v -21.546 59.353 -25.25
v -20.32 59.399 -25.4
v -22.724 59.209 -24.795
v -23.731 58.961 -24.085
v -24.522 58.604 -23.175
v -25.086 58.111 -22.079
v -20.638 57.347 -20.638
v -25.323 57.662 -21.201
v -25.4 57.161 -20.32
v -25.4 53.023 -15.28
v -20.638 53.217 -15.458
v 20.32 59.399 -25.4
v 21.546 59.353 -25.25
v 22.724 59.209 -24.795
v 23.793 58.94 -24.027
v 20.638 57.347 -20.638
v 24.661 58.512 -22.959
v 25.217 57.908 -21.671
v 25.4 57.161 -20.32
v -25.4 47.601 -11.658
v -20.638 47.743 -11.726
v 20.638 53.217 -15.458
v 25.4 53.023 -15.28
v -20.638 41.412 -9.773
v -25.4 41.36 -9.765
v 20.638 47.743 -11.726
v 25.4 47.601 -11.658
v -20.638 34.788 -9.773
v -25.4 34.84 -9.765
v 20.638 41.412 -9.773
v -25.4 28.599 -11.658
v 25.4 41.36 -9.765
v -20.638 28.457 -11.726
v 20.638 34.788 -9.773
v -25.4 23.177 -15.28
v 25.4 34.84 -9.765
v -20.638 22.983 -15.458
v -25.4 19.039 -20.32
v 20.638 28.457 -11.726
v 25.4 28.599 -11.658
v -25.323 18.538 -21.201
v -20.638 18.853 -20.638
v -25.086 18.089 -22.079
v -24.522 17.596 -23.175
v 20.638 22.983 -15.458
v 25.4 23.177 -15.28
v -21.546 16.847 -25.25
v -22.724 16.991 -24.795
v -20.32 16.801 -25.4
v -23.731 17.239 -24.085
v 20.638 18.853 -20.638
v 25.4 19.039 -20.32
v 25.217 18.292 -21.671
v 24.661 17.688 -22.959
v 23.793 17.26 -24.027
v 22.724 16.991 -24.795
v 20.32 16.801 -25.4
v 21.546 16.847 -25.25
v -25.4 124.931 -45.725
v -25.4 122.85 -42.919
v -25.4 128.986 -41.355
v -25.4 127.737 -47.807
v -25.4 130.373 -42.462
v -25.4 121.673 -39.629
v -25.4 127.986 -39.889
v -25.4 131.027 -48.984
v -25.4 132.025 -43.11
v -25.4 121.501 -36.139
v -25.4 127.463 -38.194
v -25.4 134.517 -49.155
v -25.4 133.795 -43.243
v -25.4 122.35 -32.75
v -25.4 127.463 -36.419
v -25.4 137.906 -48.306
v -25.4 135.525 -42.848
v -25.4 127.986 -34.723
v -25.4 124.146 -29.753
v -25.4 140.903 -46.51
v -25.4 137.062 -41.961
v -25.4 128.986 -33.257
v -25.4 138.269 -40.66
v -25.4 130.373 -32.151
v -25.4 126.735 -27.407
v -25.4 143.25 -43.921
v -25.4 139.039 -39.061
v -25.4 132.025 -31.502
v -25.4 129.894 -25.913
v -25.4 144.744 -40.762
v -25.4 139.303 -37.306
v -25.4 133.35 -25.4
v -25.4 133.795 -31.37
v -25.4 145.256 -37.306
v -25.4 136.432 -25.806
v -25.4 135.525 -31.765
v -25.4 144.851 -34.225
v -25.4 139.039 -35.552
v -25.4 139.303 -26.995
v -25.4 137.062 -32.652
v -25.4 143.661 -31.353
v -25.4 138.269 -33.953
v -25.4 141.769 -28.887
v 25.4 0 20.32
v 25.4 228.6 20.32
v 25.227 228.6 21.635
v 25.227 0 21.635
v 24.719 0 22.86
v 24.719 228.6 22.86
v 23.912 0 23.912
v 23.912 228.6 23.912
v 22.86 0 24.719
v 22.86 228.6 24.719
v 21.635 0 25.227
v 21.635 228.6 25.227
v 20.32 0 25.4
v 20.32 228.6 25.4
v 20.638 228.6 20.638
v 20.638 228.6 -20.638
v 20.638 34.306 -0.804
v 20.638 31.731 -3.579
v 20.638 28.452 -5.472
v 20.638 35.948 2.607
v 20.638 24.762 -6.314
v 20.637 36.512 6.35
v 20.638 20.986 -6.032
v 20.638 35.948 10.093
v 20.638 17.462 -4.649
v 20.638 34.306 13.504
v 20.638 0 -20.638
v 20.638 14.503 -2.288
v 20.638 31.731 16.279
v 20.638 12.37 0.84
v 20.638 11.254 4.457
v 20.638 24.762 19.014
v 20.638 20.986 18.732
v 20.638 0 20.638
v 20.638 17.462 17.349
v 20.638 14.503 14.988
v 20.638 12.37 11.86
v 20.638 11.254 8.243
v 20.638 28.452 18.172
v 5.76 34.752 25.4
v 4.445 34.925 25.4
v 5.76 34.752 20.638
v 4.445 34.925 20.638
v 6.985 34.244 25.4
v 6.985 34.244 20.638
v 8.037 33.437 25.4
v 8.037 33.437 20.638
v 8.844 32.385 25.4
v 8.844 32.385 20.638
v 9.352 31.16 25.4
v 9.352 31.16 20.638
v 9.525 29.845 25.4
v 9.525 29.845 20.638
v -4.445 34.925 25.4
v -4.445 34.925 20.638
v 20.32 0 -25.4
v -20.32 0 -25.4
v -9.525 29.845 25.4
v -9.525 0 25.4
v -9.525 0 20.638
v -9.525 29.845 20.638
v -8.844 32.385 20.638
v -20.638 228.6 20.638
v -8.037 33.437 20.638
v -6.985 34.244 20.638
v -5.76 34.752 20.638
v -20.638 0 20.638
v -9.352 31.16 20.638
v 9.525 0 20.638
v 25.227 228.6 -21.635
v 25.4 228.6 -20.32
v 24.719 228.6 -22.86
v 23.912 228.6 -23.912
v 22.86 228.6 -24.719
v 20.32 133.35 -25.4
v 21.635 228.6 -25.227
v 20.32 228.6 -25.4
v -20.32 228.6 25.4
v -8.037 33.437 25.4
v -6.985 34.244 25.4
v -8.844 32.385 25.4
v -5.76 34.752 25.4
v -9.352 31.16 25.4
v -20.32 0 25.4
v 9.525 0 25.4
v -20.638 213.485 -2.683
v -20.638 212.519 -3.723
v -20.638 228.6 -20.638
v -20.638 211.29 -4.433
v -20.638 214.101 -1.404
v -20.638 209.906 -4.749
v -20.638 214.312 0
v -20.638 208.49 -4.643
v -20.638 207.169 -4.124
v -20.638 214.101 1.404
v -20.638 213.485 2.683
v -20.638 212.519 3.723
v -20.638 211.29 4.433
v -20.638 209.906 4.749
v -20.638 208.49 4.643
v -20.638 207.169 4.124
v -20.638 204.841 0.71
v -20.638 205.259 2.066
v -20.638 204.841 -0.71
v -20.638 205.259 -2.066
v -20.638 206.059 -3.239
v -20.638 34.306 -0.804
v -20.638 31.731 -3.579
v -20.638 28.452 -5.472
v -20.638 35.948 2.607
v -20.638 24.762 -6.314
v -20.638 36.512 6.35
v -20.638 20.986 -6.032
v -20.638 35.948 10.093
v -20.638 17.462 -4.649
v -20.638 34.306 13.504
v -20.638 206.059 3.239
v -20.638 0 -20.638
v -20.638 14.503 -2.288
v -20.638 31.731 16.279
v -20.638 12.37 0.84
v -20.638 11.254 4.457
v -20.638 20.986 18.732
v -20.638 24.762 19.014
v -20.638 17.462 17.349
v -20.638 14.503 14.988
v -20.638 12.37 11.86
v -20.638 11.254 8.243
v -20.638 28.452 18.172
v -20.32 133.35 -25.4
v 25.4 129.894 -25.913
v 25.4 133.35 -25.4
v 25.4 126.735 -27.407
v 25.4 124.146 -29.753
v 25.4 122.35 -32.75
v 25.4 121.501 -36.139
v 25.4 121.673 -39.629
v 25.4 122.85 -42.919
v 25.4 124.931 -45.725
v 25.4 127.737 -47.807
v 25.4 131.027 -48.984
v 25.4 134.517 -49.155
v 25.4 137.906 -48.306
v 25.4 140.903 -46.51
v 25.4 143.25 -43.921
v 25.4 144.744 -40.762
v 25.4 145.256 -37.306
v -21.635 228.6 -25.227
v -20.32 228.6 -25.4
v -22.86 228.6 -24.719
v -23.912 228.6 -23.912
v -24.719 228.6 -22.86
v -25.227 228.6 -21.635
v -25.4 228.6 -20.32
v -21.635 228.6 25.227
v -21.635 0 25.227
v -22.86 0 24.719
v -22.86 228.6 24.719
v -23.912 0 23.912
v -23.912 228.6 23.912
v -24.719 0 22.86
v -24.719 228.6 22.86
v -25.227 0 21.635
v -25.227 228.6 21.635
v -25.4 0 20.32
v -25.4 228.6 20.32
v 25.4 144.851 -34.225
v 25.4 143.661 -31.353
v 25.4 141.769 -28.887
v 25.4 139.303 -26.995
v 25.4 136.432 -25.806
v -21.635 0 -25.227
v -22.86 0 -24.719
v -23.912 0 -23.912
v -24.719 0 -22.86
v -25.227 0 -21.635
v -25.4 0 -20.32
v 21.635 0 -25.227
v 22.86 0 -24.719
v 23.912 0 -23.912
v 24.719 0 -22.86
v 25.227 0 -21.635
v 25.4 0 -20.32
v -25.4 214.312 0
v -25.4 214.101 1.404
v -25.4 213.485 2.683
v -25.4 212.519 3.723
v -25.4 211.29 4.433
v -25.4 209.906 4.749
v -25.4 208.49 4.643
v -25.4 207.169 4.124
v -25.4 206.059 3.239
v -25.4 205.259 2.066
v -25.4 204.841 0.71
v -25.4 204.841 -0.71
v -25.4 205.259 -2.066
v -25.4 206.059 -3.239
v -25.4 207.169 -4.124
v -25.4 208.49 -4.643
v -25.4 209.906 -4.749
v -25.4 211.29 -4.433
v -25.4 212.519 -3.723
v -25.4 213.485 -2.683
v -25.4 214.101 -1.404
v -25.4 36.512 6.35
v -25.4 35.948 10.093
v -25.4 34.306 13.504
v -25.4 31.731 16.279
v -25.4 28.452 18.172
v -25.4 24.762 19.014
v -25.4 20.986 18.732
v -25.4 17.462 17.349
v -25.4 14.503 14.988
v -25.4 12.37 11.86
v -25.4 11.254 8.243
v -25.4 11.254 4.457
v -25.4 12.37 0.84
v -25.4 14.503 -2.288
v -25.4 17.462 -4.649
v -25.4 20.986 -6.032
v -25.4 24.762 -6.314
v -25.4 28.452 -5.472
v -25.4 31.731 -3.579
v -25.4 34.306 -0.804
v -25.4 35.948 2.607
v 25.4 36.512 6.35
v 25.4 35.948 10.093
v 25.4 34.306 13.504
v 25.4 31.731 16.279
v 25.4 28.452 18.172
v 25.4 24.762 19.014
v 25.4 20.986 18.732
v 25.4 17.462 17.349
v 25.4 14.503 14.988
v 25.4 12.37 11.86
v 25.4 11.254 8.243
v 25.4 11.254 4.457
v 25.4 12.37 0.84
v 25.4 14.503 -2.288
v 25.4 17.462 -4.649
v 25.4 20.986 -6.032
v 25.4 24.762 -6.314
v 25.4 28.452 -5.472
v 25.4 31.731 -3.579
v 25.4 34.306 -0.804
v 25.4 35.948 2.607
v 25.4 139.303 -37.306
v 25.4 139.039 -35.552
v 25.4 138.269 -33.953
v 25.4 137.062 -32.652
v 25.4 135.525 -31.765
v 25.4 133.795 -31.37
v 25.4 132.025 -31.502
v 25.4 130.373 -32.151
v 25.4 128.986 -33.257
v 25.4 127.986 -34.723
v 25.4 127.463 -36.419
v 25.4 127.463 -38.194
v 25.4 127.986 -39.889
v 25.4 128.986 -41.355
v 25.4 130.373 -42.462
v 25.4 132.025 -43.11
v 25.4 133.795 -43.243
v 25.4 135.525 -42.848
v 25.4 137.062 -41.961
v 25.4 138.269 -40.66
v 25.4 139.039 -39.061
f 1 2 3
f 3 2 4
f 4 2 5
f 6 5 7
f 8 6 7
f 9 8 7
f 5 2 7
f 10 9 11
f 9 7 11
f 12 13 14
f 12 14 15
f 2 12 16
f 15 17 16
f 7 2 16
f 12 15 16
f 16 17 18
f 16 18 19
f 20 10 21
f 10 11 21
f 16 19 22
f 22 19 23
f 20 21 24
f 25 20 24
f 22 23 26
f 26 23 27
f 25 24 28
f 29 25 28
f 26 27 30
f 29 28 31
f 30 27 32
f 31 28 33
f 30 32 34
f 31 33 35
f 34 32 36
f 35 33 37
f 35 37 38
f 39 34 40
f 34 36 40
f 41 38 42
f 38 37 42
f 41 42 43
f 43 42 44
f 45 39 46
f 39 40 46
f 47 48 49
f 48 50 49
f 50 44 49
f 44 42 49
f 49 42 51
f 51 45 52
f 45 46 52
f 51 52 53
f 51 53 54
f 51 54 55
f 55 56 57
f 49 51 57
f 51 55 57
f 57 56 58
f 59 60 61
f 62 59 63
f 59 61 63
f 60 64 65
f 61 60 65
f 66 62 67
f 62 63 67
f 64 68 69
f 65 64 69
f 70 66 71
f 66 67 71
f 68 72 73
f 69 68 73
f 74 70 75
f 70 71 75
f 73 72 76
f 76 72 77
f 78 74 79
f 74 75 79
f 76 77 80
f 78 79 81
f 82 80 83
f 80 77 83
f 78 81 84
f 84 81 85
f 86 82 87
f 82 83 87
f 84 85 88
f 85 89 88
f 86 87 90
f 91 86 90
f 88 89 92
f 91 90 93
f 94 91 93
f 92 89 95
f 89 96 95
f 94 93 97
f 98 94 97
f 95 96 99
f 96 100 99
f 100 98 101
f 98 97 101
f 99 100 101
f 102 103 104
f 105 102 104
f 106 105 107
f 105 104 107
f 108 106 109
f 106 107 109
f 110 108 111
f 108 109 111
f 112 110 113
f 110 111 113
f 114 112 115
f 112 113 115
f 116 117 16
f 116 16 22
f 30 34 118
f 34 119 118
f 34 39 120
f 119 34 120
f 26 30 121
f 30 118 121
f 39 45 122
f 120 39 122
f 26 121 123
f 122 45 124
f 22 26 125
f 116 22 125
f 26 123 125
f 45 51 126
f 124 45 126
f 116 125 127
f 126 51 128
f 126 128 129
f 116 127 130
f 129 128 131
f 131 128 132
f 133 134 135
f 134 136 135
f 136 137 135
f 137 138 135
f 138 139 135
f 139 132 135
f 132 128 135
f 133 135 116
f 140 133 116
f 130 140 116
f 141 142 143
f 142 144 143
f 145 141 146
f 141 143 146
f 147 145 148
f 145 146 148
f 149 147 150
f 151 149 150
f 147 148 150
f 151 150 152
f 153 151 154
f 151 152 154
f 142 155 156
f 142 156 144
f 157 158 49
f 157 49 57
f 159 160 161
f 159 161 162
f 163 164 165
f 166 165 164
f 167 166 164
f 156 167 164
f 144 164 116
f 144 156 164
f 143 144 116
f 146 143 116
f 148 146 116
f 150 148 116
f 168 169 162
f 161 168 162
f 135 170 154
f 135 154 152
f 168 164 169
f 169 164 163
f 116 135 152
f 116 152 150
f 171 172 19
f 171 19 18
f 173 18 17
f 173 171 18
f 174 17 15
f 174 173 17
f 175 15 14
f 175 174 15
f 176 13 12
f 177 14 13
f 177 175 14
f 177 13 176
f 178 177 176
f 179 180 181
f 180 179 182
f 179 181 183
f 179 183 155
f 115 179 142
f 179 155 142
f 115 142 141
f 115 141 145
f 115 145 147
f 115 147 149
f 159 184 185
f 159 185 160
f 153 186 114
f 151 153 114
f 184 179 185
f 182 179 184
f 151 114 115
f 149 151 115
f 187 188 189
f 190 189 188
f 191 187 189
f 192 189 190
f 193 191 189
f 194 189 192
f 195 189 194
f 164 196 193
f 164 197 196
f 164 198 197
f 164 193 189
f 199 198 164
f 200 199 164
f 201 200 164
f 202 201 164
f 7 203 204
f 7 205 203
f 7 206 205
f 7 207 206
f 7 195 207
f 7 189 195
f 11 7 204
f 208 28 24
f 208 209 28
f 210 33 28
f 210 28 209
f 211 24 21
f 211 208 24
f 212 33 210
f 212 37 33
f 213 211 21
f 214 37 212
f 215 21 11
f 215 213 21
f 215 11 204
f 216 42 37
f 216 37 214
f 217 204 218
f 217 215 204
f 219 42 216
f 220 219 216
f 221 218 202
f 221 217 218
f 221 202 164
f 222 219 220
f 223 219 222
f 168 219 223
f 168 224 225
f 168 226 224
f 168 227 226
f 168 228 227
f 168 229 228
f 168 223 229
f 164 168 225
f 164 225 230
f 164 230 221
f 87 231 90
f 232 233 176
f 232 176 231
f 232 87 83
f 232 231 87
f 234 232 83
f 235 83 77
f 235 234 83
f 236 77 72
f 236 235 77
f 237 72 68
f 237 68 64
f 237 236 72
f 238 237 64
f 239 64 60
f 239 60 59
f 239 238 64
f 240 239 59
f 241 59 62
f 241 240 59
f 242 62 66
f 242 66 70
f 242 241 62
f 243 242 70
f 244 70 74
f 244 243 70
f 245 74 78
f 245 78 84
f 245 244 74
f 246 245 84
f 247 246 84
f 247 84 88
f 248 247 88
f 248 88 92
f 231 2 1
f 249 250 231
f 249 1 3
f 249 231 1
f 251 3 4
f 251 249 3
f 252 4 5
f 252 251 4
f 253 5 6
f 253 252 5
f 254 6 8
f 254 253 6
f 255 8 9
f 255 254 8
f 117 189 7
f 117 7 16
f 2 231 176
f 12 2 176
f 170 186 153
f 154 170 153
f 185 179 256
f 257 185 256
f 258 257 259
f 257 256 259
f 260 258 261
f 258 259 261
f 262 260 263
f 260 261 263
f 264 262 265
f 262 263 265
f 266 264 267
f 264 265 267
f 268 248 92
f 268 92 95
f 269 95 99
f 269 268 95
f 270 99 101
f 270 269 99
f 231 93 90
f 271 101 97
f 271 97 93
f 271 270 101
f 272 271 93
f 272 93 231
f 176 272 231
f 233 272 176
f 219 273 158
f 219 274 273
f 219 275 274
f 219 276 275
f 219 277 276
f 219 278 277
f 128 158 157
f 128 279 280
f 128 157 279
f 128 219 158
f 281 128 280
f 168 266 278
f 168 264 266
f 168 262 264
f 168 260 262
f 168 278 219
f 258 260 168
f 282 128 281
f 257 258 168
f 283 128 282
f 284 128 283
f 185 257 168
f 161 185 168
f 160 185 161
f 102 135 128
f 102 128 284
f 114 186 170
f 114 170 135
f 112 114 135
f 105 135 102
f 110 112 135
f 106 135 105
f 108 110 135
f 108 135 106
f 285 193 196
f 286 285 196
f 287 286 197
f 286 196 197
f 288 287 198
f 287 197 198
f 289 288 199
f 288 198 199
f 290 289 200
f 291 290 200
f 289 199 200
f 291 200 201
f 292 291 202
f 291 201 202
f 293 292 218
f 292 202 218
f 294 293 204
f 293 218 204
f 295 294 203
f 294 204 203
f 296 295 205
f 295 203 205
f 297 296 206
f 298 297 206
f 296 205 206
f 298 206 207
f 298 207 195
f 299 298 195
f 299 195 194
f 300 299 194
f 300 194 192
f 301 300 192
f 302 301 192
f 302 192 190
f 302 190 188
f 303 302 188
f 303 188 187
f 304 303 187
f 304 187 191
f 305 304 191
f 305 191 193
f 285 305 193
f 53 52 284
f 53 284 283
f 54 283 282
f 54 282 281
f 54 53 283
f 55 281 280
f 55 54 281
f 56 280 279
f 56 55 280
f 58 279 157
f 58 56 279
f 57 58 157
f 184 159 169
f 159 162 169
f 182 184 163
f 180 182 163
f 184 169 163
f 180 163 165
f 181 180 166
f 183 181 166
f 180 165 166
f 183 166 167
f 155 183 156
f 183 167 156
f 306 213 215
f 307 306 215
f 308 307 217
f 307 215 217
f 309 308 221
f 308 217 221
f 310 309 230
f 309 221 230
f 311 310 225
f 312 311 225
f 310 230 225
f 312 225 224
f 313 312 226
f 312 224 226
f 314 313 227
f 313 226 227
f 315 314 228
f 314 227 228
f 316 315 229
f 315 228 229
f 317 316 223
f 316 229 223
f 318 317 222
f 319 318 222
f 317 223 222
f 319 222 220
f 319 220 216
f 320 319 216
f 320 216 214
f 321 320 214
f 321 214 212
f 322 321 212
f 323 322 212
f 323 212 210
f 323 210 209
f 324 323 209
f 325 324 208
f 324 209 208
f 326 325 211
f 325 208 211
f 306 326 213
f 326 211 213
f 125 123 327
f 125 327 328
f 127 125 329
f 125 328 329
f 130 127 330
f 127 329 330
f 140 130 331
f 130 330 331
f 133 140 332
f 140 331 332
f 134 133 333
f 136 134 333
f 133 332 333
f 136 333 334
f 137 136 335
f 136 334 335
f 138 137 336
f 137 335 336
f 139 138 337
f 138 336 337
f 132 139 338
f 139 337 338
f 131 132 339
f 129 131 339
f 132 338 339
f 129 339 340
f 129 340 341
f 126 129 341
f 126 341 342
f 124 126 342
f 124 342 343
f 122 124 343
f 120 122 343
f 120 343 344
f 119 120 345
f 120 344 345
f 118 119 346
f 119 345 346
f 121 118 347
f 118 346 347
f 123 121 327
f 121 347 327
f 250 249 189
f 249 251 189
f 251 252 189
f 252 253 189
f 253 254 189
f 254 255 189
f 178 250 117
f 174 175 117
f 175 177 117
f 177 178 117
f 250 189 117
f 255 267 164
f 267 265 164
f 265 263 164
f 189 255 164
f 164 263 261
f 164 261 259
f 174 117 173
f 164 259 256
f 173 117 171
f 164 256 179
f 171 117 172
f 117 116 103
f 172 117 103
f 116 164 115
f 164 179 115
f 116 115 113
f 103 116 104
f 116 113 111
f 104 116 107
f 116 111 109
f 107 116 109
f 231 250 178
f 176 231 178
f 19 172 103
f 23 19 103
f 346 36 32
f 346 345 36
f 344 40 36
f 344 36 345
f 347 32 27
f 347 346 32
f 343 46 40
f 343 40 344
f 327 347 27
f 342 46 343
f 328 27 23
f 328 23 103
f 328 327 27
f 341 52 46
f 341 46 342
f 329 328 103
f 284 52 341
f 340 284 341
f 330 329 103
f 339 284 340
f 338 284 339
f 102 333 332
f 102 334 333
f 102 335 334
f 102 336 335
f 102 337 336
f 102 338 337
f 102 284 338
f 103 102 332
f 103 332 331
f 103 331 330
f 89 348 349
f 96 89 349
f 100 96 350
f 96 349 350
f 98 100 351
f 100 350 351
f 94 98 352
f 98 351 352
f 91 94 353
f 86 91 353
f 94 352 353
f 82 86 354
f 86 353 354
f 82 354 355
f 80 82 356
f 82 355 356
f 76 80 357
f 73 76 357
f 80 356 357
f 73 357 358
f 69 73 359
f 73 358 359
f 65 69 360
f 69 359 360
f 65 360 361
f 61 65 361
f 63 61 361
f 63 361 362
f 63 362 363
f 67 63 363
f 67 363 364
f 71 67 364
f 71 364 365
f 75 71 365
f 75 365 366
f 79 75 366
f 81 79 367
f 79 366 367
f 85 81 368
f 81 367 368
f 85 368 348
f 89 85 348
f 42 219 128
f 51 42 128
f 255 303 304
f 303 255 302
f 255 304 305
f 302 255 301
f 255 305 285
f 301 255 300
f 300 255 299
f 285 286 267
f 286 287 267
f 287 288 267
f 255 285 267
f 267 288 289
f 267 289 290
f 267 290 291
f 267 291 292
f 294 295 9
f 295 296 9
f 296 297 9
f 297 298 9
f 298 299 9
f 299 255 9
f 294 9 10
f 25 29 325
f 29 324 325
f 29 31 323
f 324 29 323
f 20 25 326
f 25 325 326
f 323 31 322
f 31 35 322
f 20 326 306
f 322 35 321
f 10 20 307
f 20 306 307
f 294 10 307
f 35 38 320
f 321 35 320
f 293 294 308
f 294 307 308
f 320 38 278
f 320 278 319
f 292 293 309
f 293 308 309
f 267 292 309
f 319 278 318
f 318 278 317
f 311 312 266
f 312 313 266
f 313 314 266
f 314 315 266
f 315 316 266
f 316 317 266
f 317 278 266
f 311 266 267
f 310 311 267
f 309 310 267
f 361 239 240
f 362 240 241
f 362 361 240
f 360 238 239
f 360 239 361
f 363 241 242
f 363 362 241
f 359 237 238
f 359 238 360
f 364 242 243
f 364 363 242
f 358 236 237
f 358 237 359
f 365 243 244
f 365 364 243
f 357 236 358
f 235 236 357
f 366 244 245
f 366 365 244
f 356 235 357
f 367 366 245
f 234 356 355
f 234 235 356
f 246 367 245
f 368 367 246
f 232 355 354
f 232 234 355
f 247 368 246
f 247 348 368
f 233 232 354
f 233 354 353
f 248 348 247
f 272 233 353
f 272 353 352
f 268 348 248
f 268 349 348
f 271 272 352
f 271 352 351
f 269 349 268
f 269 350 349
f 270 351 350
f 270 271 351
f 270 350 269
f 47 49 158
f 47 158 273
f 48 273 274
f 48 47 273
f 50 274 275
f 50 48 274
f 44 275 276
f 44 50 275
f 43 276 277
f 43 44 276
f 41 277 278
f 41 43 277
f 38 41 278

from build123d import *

# Parameters (mm, degrees)
F0_W        = 50.8
F0_H        = 50.8
F0_W_2      = 41.275
F0_H_2      = 41.275
F1_DEPTH    = 228.6
F2_R        = 22.225
F2_R_2      = 12.7
F3_DEPTH    = 25.4
F4_R        = 5.953125
F5_DEPTH    = 50.8
F6_T1_DEPTH = 254
F6_T3_DEPTH = 86.6514525143
F6_T5_DEPTH = 107.95
F6_T7_DEPTH = 42.2014525143
F7_W        = 19.05
F7_H        = 34.925
F8_DEPTH    = 4.7625
F9_R        = 5.08
F11_D       = 9.525
F11_DEPTH   = 12.7
F11_TIP     = 2.8615986981


# Not quite as in the source:
# - a fillet or chamfer that OpenCascade refuses, or shapes differently, is made with other operations: its cross-section is extruded or revolved along the edge and cut away or added


with BuildPart() as f1:
    # F0 (on Front) → F1 (new body)
    with BuildSketch(Plane.XZ):
        Rectangle(F0_W, F0_H)
        Rectangle(F0_W_2, F0_H_2, mode=Mode.SUBTRACT)
    extrude(amount=-F1_DEPTH)

    # F2 (on Right) → F3 (cut, symmetric)
    with BuildSketch(Plane.YZ):
        with Locations((38.1, -31.75)):
            Circle(F2_R)
        with Locations((23.8125, 6.35)):
            Circle(F2_R_2)
    extrude(amount=F3_DEPTH, both=True, mode=Mode.SUBTRACT)

    # F4 (on face) → F5 (join)
    with BuildSketch(Plane.YZ.offset(25.4)):
        with BuildLine():
            ThreePointArc((133.35, -25.4), (124.9310098865, -45.7252401135), (145.25625, -37.30625))
            ThreePointArc((145.25625, -37.30625), (141.7689901135, -28.8872598865), (133.35, -25.4))
        make_face()
        with Locations((133.35, -37.30625)):
            Circle(F4_R, mode=Mode.SUBTRACT)
    extrude(amount=-F5_DEPTH)

    # F6: fillet of radius 5.08 on 8 edges, made by hand

    # F6_s2 → F6_t1 (cut)
    with BuildSketch(Plane.XZ.offset(-241.3)):
        with BuildLine():
            ThreePointArc((25.4, 20.32), (23.9121024484, 23.9121024484), (20.32, 25.4))
            Line((20.32, 25.4), (25.4, 25.4))
            Line((25.4, 25.4), (25.4, 20.32))
        make_face()
        with BuildLine():
            ThreePointArc((-20.32, 25.4), (-23.9121024484, 23.9121024484), (-25.4, 20.32))
            Line((-25.4, 20.32), (-25.4, 25.4))
            Line((-25.4, 25.4), (-20.32, 25.4))
        make_face()
    extrude(amount=F6_T1_DEPTH, mode=Mode.SUBTRACT)

    # F6_s4 → F6_t3 (cut)
    with BuildSketch(Plane.XZ.offset(-133.35)):
        with BuildLine():
            ThreePointArc((25.4, -20.32), (23.9121024484, -23.9121024484), (20.32, -25.4))
            Line((20.32, -25.4), (25.4, -25.4))
            Line((25.4, -25.4), (25.4, -20.32))
        make_face()
        with BuildLine():
            ThreePointArc((-20.32, -25.4), (-23.9121024484, -23.9121024484), (-25.4, -20.32))
            Line((-25.4, -20.32), (-25.4, -25.4))
            Line((-25.4, -25.4), (-20.32, -25.4))
        make_face()
    extrude(amount=F6_T3_DEPTH, mode=Mode.SUBTRACT)

    # F6_s6 → F6_t5 (cut)
    with BuildSketch(Plane.XZ.offset(-241.3)):
        with BuildLine():
            ThreePointArc((25.4, -20.32), (23.9121024484, -23.9121024484), (20.32, -25.4))
            Line((20.32, -25.4), (25.4, -25.4))
            Line((25.4, -25.4), (25.4, -20.32))
        make_face()
        with BuildLine():
            ThreePointArc((-20.32, -25.4), (-23.9121024484, -23.9121024484), (-25.4, -20.32))
            Line((-25.4, -20.32), (-25.4, -25.4))
            Line((-25.4, -25.4), (-20.32, -25.4))
        make_face()
    extrude(amount=F6_T5_DEPTH, mode=Mode.SUBTRACT)

    # F6_s8 → F6_t7 (cut)
    with BuildSketch(Plane.XZ.offset(-29.5014525143)):
        with BuildLine():
            ThreePointArc((25.4, -20.32), (23.9121024484, -23.9121024484), (20.32, -25.4))
            Line((20.32, -25.4), (25.4, -25.4))
            Line((25.4, -25.4), (25.4, -20.32))
        make_face()
        with BuildLine():
            ThreePointArc((-20.32, -25.4), (-23.9121024484, -23.9121024484), (-25.4, -20.32))
            Line((-25.4, -20.32), (-25.4, -25.4))
            Line((-25.4, -25.4), (-20.32, -25.4))
        make_face()
    extrude(amount=F6_T7_DEPTH, mode=Mode.SUBTRACT)

    # F7 (on face) → F8 (cut, through all)
    with BuildSketch(Plane.XY.offset(25.4)):
        with Locations((0, 17.4625)):
            Rectangle(F7_W, F7_H)
    extrude(amount=-F8_DEPTH, mode=Mode.SUBTRACT)

    # F9
    f9_edges = [f1.edges().sort_by_distance(p)[0] for p in [
        (9.525, 34.925, 23.01875),
        (-9.525, 34.925, 23.01875),
    ]]
    fillet(f9_edges, radius=F9_R)

    # F11
    with Locations(Plane(origin=(-25.4, 0, 0), x_dir=(0, -1, 0), z_dir=(-1, 0, 0))):
        with Locations((-209.55, 0)):
            Hole(F11_D / 2, depth=F11_DEPTH)
            with Locations((0, 0, -(F11_DEPTH + F11_TIP / 2))):  # 118° drill point
                Cone(0, F11_D / 2, F11_TIP, mode=Mode.SUBTRACT)


solid = f1.part
